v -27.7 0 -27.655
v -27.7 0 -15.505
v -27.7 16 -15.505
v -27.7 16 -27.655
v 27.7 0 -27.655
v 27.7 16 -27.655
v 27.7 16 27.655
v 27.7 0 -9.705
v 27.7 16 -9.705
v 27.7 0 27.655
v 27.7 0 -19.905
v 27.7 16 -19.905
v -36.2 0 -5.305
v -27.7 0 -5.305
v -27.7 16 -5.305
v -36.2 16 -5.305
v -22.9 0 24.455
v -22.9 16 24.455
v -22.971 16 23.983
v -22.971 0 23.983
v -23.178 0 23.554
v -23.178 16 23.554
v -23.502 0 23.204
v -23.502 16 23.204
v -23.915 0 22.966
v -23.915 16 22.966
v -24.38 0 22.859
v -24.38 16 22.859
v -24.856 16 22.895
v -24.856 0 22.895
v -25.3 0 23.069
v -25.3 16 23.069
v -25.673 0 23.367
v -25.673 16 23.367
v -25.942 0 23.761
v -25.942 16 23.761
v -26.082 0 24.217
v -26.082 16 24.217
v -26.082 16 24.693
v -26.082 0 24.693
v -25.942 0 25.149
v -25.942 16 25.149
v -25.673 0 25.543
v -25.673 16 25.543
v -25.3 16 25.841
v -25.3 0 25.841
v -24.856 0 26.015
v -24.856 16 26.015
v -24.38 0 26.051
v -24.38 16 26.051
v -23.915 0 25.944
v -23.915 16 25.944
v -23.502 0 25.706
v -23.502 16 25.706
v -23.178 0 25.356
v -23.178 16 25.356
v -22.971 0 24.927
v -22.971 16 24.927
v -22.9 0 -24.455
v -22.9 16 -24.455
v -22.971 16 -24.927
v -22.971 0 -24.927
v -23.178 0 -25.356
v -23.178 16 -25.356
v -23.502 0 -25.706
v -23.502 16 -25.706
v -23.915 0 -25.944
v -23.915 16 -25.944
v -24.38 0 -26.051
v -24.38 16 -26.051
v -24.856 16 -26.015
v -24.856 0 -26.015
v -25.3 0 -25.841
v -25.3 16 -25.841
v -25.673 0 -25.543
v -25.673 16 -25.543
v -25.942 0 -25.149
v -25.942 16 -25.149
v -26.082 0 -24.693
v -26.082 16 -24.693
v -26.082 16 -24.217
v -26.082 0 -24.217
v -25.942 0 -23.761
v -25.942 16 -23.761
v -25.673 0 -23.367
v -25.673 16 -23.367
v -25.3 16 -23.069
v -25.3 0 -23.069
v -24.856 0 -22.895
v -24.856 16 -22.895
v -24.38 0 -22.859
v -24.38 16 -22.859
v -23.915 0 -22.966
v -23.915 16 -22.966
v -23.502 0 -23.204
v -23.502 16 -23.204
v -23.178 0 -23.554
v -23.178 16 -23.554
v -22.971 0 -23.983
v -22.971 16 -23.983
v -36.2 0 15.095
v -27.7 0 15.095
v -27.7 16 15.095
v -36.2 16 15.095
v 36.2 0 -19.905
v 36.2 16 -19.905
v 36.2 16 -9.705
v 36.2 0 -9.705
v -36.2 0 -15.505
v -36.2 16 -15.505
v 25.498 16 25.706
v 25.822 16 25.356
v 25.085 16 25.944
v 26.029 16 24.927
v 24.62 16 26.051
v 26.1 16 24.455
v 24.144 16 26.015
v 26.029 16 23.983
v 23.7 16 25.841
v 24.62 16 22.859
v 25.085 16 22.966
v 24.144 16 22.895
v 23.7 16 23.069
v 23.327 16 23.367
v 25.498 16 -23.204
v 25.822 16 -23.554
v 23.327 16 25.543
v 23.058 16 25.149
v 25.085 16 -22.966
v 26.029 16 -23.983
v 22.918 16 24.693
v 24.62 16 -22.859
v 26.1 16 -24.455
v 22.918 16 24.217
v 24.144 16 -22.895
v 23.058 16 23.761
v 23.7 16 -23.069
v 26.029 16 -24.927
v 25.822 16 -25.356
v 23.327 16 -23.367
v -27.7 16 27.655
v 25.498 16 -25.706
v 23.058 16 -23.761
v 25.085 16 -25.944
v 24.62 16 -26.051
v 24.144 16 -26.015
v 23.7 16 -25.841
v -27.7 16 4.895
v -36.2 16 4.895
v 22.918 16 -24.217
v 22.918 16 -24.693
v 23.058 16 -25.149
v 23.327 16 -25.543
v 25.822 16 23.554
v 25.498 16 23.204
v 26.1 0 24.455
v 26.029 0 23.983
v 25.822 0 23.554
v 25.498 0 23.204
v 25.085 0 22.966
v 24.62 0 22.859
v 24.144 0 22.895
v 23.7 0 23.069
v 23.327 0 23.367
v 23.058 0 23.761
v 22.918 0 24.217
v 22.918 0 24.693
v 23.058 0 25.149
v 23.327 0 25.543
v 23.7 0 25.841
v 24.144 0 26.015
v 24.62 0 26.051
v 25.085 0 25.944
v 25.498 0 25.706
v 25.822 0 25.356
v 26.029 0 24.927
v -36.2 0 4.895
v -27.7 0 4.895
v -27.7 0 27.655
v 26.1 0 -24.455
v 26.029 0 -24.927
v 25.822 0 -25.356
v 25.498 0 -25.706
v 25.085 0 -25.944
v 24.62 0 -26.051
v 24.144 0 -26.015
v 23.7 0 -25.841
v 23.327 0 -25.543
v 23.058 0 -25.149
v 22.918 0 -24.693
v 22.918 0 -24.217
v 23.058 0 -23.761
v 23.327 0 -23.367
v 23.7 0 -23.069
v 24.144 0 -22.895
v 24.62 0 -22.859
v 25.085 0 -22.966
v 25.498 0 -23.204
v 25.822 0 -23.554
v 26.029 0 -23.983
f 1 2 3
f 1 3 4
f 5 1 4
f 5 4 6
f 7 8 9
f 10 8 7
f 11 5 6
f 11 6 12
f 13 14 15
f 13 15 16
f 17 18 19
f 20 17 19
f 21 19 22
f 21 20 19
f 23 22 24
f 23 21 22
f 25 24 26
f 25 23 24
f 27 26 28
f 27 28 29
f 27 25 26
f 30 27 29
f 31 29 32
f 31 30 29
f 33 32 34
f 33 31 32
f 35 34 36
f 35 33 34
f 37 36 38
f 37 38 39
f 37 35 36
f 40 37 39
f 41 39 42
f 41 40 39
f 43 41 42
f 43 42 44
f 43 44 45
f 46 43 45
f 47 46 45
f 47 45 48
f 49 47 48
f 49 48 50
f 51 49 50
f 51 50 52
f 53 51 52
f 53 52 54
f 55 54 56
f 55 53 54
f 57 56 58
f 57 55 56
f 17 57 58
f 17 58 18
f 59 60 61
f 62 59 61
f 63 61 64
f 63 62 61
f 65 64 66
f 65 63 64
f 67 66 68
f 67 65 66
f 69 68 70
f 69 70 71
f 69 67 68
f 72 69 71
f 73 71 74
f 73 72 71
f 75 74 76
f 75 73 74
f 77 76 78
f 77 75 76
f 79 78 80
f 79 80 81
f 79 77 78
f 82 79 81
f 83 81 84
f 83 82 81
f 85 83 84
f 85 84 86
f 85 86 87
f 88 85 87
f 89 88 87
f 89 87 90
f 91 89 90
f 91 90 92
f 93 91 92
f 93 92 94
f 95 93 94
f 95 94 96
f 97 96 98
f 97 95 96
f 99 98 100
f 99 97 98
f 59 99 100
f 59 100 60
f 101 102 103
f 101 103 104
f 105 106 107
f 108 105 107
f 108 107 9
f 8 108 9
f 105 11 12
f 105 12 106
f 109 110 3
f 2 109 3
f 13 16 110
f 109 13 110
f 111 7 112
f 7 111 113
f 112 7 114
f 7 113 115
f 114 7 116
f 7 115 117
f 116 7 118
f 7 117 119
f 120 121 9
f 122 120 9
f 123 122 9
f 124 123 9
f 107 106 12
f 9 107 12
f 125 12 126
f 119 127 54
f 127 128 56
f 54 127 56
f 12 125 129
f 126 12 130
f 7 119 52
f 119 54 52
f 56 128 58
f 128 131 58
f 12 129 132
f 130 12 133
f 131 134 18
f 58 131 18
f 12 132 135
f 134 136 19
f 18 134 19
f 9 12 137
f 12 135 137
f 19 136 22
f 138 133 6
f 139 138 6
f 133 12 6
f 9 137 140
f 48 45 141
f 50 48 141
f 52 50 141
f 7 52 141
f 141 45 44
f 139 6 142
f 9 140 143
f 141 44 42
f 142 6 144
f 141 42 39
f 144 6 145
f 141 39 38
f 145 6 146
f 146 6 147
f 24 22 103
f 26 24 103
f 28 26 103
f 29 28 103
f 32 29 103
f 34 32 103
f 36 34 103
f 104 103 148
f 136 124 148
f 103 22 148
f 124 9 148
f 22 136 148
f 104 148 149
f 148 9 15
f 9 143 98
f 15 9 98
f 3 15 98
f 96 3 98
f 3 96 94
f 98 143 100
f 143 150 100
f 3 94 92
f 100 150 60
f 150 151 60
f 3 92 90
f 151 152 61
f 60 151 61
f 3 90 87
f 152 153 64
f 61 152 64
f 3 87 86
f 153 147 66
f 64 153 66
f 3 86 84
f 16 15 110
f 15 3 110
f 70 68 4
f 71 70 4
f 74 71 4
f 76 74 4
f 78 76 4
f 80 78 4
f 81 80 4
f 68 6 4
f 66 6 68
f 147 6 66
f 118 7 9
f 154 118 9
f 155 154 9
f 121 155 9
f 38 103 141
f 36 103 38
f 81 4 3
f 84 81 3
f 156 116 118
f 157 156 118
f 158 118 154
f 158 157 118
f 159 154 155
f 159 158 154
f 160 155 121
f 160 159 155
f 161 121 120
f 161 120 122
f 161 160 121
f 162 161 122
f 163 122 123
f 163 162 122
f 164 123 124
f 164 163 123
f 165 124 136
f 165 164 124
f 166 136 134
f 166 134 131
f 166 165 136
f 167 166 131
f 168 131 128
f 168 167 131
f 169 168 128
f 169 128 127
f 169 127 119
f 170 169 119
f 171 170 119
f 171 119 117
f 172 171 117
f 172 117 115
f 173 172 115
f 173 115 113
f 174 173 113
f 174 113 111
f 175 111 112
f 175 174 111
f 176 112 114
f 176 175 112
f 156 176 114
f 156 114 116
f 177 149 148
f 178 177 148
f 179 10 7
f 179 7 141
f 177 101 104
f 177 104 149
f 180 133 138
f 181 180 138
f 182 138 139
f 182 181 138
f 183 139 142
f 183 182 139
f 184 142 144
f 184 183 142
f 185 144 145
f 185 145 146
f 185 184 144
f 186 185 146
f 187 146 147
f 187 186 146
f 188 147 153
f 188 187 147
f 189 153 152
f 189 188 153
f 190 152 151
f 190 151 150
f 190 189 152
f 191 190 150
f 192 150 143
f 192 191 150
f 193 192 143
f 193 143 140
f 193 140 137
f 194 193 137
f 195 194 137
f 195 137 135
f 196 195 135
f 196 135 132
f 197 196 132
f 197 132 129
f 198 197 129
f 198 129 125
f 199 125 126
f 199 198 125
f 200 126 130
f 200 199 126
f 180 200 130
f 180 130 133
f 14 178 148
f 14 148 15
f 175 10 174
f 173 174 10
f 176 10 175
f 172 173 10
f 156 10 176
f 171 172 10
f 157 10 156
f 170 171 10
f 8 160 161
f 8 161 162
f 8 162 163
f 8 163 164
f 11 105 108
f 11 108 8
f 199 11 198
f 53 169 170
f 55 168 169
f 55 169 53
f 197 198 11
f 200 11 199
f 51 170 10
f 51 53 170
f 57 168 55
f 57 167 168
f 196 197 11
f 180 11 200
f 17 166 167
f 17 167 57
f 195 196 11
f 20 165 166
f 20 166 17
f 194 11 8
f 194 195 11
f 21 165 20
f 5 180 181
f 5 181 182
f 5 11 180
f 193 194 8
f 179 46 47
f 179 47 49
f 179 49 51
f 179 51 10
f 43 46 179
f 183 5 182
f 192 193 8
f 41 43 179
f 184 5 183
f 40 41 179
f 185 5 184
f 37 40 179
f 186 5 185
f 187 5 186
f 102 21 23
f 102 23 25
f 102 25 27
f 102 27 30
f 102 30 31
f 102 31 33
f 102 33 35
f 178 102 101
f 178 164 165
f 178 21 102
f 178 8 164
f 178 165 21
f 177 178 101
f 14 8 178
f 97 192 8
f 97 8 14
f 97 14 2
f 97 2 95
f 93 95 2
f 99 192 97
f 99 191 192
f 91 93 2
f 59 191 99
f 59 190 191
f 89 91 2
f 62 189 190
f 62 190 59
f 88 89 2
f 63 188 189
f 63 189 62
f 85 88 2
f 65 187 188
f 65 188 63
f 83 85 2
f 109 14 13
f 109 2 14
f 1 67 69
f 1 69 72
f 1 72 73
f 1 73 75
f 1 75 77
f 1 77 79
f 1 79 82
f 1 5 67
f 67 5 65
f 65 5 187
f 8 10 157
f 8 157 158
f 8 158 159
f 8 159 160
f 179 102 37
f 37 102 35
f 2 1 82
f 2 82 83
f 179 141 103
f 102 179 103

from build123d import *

# Parameters (mm, degrees)
SKETCH1_R           = 1.6
BOSS_EXTRUDE1_DEPTH = 16


with BuildPart() as part:
    # Sketch1 → Boss-Extrude1 (new body)
    with BuildSketch(Plane(origin=(0, 0, 0), x_dir=(1, 0, 0), z_dir=(0, 1, 0))):
        Polygon((-27.7, 27.655), (27.7, 27.655), (27.7, 19.905), (36.2, 19.905), (36.2, 9.705), (27.7, 9.705), (27.7, -27.655), (-27.7, -27.655), (-27.7, -15.095), (-36.2, -15.095), (-36.2, -4.895), (-27.7, -4.895), (-27.7, 5.305), (-36.2, 5.305), (-36.2, 15.505), (-27.7, 15.505), align=None)
        with Locations((-24.5, 24.455)):
            Circle(SKETCH1_R, mode=Mode.SUBTRACT)
        with Locations((24.5, 24.455)):
            Circle(SKETCH1_R, mode=Mode.SUBTRACT)
        with Locations((-24.5, -24.455)):
            Circle(SKETCH1_R, mode=Mode.SUBTRACT)
        with Locations((24.5, -24.455)):
            Circle(SKETCH1_R, mode=Mode.SUBTRACT)
    extrude(amount=BOSS_EXTRUDE1_DEPTH)


solid = part.part
